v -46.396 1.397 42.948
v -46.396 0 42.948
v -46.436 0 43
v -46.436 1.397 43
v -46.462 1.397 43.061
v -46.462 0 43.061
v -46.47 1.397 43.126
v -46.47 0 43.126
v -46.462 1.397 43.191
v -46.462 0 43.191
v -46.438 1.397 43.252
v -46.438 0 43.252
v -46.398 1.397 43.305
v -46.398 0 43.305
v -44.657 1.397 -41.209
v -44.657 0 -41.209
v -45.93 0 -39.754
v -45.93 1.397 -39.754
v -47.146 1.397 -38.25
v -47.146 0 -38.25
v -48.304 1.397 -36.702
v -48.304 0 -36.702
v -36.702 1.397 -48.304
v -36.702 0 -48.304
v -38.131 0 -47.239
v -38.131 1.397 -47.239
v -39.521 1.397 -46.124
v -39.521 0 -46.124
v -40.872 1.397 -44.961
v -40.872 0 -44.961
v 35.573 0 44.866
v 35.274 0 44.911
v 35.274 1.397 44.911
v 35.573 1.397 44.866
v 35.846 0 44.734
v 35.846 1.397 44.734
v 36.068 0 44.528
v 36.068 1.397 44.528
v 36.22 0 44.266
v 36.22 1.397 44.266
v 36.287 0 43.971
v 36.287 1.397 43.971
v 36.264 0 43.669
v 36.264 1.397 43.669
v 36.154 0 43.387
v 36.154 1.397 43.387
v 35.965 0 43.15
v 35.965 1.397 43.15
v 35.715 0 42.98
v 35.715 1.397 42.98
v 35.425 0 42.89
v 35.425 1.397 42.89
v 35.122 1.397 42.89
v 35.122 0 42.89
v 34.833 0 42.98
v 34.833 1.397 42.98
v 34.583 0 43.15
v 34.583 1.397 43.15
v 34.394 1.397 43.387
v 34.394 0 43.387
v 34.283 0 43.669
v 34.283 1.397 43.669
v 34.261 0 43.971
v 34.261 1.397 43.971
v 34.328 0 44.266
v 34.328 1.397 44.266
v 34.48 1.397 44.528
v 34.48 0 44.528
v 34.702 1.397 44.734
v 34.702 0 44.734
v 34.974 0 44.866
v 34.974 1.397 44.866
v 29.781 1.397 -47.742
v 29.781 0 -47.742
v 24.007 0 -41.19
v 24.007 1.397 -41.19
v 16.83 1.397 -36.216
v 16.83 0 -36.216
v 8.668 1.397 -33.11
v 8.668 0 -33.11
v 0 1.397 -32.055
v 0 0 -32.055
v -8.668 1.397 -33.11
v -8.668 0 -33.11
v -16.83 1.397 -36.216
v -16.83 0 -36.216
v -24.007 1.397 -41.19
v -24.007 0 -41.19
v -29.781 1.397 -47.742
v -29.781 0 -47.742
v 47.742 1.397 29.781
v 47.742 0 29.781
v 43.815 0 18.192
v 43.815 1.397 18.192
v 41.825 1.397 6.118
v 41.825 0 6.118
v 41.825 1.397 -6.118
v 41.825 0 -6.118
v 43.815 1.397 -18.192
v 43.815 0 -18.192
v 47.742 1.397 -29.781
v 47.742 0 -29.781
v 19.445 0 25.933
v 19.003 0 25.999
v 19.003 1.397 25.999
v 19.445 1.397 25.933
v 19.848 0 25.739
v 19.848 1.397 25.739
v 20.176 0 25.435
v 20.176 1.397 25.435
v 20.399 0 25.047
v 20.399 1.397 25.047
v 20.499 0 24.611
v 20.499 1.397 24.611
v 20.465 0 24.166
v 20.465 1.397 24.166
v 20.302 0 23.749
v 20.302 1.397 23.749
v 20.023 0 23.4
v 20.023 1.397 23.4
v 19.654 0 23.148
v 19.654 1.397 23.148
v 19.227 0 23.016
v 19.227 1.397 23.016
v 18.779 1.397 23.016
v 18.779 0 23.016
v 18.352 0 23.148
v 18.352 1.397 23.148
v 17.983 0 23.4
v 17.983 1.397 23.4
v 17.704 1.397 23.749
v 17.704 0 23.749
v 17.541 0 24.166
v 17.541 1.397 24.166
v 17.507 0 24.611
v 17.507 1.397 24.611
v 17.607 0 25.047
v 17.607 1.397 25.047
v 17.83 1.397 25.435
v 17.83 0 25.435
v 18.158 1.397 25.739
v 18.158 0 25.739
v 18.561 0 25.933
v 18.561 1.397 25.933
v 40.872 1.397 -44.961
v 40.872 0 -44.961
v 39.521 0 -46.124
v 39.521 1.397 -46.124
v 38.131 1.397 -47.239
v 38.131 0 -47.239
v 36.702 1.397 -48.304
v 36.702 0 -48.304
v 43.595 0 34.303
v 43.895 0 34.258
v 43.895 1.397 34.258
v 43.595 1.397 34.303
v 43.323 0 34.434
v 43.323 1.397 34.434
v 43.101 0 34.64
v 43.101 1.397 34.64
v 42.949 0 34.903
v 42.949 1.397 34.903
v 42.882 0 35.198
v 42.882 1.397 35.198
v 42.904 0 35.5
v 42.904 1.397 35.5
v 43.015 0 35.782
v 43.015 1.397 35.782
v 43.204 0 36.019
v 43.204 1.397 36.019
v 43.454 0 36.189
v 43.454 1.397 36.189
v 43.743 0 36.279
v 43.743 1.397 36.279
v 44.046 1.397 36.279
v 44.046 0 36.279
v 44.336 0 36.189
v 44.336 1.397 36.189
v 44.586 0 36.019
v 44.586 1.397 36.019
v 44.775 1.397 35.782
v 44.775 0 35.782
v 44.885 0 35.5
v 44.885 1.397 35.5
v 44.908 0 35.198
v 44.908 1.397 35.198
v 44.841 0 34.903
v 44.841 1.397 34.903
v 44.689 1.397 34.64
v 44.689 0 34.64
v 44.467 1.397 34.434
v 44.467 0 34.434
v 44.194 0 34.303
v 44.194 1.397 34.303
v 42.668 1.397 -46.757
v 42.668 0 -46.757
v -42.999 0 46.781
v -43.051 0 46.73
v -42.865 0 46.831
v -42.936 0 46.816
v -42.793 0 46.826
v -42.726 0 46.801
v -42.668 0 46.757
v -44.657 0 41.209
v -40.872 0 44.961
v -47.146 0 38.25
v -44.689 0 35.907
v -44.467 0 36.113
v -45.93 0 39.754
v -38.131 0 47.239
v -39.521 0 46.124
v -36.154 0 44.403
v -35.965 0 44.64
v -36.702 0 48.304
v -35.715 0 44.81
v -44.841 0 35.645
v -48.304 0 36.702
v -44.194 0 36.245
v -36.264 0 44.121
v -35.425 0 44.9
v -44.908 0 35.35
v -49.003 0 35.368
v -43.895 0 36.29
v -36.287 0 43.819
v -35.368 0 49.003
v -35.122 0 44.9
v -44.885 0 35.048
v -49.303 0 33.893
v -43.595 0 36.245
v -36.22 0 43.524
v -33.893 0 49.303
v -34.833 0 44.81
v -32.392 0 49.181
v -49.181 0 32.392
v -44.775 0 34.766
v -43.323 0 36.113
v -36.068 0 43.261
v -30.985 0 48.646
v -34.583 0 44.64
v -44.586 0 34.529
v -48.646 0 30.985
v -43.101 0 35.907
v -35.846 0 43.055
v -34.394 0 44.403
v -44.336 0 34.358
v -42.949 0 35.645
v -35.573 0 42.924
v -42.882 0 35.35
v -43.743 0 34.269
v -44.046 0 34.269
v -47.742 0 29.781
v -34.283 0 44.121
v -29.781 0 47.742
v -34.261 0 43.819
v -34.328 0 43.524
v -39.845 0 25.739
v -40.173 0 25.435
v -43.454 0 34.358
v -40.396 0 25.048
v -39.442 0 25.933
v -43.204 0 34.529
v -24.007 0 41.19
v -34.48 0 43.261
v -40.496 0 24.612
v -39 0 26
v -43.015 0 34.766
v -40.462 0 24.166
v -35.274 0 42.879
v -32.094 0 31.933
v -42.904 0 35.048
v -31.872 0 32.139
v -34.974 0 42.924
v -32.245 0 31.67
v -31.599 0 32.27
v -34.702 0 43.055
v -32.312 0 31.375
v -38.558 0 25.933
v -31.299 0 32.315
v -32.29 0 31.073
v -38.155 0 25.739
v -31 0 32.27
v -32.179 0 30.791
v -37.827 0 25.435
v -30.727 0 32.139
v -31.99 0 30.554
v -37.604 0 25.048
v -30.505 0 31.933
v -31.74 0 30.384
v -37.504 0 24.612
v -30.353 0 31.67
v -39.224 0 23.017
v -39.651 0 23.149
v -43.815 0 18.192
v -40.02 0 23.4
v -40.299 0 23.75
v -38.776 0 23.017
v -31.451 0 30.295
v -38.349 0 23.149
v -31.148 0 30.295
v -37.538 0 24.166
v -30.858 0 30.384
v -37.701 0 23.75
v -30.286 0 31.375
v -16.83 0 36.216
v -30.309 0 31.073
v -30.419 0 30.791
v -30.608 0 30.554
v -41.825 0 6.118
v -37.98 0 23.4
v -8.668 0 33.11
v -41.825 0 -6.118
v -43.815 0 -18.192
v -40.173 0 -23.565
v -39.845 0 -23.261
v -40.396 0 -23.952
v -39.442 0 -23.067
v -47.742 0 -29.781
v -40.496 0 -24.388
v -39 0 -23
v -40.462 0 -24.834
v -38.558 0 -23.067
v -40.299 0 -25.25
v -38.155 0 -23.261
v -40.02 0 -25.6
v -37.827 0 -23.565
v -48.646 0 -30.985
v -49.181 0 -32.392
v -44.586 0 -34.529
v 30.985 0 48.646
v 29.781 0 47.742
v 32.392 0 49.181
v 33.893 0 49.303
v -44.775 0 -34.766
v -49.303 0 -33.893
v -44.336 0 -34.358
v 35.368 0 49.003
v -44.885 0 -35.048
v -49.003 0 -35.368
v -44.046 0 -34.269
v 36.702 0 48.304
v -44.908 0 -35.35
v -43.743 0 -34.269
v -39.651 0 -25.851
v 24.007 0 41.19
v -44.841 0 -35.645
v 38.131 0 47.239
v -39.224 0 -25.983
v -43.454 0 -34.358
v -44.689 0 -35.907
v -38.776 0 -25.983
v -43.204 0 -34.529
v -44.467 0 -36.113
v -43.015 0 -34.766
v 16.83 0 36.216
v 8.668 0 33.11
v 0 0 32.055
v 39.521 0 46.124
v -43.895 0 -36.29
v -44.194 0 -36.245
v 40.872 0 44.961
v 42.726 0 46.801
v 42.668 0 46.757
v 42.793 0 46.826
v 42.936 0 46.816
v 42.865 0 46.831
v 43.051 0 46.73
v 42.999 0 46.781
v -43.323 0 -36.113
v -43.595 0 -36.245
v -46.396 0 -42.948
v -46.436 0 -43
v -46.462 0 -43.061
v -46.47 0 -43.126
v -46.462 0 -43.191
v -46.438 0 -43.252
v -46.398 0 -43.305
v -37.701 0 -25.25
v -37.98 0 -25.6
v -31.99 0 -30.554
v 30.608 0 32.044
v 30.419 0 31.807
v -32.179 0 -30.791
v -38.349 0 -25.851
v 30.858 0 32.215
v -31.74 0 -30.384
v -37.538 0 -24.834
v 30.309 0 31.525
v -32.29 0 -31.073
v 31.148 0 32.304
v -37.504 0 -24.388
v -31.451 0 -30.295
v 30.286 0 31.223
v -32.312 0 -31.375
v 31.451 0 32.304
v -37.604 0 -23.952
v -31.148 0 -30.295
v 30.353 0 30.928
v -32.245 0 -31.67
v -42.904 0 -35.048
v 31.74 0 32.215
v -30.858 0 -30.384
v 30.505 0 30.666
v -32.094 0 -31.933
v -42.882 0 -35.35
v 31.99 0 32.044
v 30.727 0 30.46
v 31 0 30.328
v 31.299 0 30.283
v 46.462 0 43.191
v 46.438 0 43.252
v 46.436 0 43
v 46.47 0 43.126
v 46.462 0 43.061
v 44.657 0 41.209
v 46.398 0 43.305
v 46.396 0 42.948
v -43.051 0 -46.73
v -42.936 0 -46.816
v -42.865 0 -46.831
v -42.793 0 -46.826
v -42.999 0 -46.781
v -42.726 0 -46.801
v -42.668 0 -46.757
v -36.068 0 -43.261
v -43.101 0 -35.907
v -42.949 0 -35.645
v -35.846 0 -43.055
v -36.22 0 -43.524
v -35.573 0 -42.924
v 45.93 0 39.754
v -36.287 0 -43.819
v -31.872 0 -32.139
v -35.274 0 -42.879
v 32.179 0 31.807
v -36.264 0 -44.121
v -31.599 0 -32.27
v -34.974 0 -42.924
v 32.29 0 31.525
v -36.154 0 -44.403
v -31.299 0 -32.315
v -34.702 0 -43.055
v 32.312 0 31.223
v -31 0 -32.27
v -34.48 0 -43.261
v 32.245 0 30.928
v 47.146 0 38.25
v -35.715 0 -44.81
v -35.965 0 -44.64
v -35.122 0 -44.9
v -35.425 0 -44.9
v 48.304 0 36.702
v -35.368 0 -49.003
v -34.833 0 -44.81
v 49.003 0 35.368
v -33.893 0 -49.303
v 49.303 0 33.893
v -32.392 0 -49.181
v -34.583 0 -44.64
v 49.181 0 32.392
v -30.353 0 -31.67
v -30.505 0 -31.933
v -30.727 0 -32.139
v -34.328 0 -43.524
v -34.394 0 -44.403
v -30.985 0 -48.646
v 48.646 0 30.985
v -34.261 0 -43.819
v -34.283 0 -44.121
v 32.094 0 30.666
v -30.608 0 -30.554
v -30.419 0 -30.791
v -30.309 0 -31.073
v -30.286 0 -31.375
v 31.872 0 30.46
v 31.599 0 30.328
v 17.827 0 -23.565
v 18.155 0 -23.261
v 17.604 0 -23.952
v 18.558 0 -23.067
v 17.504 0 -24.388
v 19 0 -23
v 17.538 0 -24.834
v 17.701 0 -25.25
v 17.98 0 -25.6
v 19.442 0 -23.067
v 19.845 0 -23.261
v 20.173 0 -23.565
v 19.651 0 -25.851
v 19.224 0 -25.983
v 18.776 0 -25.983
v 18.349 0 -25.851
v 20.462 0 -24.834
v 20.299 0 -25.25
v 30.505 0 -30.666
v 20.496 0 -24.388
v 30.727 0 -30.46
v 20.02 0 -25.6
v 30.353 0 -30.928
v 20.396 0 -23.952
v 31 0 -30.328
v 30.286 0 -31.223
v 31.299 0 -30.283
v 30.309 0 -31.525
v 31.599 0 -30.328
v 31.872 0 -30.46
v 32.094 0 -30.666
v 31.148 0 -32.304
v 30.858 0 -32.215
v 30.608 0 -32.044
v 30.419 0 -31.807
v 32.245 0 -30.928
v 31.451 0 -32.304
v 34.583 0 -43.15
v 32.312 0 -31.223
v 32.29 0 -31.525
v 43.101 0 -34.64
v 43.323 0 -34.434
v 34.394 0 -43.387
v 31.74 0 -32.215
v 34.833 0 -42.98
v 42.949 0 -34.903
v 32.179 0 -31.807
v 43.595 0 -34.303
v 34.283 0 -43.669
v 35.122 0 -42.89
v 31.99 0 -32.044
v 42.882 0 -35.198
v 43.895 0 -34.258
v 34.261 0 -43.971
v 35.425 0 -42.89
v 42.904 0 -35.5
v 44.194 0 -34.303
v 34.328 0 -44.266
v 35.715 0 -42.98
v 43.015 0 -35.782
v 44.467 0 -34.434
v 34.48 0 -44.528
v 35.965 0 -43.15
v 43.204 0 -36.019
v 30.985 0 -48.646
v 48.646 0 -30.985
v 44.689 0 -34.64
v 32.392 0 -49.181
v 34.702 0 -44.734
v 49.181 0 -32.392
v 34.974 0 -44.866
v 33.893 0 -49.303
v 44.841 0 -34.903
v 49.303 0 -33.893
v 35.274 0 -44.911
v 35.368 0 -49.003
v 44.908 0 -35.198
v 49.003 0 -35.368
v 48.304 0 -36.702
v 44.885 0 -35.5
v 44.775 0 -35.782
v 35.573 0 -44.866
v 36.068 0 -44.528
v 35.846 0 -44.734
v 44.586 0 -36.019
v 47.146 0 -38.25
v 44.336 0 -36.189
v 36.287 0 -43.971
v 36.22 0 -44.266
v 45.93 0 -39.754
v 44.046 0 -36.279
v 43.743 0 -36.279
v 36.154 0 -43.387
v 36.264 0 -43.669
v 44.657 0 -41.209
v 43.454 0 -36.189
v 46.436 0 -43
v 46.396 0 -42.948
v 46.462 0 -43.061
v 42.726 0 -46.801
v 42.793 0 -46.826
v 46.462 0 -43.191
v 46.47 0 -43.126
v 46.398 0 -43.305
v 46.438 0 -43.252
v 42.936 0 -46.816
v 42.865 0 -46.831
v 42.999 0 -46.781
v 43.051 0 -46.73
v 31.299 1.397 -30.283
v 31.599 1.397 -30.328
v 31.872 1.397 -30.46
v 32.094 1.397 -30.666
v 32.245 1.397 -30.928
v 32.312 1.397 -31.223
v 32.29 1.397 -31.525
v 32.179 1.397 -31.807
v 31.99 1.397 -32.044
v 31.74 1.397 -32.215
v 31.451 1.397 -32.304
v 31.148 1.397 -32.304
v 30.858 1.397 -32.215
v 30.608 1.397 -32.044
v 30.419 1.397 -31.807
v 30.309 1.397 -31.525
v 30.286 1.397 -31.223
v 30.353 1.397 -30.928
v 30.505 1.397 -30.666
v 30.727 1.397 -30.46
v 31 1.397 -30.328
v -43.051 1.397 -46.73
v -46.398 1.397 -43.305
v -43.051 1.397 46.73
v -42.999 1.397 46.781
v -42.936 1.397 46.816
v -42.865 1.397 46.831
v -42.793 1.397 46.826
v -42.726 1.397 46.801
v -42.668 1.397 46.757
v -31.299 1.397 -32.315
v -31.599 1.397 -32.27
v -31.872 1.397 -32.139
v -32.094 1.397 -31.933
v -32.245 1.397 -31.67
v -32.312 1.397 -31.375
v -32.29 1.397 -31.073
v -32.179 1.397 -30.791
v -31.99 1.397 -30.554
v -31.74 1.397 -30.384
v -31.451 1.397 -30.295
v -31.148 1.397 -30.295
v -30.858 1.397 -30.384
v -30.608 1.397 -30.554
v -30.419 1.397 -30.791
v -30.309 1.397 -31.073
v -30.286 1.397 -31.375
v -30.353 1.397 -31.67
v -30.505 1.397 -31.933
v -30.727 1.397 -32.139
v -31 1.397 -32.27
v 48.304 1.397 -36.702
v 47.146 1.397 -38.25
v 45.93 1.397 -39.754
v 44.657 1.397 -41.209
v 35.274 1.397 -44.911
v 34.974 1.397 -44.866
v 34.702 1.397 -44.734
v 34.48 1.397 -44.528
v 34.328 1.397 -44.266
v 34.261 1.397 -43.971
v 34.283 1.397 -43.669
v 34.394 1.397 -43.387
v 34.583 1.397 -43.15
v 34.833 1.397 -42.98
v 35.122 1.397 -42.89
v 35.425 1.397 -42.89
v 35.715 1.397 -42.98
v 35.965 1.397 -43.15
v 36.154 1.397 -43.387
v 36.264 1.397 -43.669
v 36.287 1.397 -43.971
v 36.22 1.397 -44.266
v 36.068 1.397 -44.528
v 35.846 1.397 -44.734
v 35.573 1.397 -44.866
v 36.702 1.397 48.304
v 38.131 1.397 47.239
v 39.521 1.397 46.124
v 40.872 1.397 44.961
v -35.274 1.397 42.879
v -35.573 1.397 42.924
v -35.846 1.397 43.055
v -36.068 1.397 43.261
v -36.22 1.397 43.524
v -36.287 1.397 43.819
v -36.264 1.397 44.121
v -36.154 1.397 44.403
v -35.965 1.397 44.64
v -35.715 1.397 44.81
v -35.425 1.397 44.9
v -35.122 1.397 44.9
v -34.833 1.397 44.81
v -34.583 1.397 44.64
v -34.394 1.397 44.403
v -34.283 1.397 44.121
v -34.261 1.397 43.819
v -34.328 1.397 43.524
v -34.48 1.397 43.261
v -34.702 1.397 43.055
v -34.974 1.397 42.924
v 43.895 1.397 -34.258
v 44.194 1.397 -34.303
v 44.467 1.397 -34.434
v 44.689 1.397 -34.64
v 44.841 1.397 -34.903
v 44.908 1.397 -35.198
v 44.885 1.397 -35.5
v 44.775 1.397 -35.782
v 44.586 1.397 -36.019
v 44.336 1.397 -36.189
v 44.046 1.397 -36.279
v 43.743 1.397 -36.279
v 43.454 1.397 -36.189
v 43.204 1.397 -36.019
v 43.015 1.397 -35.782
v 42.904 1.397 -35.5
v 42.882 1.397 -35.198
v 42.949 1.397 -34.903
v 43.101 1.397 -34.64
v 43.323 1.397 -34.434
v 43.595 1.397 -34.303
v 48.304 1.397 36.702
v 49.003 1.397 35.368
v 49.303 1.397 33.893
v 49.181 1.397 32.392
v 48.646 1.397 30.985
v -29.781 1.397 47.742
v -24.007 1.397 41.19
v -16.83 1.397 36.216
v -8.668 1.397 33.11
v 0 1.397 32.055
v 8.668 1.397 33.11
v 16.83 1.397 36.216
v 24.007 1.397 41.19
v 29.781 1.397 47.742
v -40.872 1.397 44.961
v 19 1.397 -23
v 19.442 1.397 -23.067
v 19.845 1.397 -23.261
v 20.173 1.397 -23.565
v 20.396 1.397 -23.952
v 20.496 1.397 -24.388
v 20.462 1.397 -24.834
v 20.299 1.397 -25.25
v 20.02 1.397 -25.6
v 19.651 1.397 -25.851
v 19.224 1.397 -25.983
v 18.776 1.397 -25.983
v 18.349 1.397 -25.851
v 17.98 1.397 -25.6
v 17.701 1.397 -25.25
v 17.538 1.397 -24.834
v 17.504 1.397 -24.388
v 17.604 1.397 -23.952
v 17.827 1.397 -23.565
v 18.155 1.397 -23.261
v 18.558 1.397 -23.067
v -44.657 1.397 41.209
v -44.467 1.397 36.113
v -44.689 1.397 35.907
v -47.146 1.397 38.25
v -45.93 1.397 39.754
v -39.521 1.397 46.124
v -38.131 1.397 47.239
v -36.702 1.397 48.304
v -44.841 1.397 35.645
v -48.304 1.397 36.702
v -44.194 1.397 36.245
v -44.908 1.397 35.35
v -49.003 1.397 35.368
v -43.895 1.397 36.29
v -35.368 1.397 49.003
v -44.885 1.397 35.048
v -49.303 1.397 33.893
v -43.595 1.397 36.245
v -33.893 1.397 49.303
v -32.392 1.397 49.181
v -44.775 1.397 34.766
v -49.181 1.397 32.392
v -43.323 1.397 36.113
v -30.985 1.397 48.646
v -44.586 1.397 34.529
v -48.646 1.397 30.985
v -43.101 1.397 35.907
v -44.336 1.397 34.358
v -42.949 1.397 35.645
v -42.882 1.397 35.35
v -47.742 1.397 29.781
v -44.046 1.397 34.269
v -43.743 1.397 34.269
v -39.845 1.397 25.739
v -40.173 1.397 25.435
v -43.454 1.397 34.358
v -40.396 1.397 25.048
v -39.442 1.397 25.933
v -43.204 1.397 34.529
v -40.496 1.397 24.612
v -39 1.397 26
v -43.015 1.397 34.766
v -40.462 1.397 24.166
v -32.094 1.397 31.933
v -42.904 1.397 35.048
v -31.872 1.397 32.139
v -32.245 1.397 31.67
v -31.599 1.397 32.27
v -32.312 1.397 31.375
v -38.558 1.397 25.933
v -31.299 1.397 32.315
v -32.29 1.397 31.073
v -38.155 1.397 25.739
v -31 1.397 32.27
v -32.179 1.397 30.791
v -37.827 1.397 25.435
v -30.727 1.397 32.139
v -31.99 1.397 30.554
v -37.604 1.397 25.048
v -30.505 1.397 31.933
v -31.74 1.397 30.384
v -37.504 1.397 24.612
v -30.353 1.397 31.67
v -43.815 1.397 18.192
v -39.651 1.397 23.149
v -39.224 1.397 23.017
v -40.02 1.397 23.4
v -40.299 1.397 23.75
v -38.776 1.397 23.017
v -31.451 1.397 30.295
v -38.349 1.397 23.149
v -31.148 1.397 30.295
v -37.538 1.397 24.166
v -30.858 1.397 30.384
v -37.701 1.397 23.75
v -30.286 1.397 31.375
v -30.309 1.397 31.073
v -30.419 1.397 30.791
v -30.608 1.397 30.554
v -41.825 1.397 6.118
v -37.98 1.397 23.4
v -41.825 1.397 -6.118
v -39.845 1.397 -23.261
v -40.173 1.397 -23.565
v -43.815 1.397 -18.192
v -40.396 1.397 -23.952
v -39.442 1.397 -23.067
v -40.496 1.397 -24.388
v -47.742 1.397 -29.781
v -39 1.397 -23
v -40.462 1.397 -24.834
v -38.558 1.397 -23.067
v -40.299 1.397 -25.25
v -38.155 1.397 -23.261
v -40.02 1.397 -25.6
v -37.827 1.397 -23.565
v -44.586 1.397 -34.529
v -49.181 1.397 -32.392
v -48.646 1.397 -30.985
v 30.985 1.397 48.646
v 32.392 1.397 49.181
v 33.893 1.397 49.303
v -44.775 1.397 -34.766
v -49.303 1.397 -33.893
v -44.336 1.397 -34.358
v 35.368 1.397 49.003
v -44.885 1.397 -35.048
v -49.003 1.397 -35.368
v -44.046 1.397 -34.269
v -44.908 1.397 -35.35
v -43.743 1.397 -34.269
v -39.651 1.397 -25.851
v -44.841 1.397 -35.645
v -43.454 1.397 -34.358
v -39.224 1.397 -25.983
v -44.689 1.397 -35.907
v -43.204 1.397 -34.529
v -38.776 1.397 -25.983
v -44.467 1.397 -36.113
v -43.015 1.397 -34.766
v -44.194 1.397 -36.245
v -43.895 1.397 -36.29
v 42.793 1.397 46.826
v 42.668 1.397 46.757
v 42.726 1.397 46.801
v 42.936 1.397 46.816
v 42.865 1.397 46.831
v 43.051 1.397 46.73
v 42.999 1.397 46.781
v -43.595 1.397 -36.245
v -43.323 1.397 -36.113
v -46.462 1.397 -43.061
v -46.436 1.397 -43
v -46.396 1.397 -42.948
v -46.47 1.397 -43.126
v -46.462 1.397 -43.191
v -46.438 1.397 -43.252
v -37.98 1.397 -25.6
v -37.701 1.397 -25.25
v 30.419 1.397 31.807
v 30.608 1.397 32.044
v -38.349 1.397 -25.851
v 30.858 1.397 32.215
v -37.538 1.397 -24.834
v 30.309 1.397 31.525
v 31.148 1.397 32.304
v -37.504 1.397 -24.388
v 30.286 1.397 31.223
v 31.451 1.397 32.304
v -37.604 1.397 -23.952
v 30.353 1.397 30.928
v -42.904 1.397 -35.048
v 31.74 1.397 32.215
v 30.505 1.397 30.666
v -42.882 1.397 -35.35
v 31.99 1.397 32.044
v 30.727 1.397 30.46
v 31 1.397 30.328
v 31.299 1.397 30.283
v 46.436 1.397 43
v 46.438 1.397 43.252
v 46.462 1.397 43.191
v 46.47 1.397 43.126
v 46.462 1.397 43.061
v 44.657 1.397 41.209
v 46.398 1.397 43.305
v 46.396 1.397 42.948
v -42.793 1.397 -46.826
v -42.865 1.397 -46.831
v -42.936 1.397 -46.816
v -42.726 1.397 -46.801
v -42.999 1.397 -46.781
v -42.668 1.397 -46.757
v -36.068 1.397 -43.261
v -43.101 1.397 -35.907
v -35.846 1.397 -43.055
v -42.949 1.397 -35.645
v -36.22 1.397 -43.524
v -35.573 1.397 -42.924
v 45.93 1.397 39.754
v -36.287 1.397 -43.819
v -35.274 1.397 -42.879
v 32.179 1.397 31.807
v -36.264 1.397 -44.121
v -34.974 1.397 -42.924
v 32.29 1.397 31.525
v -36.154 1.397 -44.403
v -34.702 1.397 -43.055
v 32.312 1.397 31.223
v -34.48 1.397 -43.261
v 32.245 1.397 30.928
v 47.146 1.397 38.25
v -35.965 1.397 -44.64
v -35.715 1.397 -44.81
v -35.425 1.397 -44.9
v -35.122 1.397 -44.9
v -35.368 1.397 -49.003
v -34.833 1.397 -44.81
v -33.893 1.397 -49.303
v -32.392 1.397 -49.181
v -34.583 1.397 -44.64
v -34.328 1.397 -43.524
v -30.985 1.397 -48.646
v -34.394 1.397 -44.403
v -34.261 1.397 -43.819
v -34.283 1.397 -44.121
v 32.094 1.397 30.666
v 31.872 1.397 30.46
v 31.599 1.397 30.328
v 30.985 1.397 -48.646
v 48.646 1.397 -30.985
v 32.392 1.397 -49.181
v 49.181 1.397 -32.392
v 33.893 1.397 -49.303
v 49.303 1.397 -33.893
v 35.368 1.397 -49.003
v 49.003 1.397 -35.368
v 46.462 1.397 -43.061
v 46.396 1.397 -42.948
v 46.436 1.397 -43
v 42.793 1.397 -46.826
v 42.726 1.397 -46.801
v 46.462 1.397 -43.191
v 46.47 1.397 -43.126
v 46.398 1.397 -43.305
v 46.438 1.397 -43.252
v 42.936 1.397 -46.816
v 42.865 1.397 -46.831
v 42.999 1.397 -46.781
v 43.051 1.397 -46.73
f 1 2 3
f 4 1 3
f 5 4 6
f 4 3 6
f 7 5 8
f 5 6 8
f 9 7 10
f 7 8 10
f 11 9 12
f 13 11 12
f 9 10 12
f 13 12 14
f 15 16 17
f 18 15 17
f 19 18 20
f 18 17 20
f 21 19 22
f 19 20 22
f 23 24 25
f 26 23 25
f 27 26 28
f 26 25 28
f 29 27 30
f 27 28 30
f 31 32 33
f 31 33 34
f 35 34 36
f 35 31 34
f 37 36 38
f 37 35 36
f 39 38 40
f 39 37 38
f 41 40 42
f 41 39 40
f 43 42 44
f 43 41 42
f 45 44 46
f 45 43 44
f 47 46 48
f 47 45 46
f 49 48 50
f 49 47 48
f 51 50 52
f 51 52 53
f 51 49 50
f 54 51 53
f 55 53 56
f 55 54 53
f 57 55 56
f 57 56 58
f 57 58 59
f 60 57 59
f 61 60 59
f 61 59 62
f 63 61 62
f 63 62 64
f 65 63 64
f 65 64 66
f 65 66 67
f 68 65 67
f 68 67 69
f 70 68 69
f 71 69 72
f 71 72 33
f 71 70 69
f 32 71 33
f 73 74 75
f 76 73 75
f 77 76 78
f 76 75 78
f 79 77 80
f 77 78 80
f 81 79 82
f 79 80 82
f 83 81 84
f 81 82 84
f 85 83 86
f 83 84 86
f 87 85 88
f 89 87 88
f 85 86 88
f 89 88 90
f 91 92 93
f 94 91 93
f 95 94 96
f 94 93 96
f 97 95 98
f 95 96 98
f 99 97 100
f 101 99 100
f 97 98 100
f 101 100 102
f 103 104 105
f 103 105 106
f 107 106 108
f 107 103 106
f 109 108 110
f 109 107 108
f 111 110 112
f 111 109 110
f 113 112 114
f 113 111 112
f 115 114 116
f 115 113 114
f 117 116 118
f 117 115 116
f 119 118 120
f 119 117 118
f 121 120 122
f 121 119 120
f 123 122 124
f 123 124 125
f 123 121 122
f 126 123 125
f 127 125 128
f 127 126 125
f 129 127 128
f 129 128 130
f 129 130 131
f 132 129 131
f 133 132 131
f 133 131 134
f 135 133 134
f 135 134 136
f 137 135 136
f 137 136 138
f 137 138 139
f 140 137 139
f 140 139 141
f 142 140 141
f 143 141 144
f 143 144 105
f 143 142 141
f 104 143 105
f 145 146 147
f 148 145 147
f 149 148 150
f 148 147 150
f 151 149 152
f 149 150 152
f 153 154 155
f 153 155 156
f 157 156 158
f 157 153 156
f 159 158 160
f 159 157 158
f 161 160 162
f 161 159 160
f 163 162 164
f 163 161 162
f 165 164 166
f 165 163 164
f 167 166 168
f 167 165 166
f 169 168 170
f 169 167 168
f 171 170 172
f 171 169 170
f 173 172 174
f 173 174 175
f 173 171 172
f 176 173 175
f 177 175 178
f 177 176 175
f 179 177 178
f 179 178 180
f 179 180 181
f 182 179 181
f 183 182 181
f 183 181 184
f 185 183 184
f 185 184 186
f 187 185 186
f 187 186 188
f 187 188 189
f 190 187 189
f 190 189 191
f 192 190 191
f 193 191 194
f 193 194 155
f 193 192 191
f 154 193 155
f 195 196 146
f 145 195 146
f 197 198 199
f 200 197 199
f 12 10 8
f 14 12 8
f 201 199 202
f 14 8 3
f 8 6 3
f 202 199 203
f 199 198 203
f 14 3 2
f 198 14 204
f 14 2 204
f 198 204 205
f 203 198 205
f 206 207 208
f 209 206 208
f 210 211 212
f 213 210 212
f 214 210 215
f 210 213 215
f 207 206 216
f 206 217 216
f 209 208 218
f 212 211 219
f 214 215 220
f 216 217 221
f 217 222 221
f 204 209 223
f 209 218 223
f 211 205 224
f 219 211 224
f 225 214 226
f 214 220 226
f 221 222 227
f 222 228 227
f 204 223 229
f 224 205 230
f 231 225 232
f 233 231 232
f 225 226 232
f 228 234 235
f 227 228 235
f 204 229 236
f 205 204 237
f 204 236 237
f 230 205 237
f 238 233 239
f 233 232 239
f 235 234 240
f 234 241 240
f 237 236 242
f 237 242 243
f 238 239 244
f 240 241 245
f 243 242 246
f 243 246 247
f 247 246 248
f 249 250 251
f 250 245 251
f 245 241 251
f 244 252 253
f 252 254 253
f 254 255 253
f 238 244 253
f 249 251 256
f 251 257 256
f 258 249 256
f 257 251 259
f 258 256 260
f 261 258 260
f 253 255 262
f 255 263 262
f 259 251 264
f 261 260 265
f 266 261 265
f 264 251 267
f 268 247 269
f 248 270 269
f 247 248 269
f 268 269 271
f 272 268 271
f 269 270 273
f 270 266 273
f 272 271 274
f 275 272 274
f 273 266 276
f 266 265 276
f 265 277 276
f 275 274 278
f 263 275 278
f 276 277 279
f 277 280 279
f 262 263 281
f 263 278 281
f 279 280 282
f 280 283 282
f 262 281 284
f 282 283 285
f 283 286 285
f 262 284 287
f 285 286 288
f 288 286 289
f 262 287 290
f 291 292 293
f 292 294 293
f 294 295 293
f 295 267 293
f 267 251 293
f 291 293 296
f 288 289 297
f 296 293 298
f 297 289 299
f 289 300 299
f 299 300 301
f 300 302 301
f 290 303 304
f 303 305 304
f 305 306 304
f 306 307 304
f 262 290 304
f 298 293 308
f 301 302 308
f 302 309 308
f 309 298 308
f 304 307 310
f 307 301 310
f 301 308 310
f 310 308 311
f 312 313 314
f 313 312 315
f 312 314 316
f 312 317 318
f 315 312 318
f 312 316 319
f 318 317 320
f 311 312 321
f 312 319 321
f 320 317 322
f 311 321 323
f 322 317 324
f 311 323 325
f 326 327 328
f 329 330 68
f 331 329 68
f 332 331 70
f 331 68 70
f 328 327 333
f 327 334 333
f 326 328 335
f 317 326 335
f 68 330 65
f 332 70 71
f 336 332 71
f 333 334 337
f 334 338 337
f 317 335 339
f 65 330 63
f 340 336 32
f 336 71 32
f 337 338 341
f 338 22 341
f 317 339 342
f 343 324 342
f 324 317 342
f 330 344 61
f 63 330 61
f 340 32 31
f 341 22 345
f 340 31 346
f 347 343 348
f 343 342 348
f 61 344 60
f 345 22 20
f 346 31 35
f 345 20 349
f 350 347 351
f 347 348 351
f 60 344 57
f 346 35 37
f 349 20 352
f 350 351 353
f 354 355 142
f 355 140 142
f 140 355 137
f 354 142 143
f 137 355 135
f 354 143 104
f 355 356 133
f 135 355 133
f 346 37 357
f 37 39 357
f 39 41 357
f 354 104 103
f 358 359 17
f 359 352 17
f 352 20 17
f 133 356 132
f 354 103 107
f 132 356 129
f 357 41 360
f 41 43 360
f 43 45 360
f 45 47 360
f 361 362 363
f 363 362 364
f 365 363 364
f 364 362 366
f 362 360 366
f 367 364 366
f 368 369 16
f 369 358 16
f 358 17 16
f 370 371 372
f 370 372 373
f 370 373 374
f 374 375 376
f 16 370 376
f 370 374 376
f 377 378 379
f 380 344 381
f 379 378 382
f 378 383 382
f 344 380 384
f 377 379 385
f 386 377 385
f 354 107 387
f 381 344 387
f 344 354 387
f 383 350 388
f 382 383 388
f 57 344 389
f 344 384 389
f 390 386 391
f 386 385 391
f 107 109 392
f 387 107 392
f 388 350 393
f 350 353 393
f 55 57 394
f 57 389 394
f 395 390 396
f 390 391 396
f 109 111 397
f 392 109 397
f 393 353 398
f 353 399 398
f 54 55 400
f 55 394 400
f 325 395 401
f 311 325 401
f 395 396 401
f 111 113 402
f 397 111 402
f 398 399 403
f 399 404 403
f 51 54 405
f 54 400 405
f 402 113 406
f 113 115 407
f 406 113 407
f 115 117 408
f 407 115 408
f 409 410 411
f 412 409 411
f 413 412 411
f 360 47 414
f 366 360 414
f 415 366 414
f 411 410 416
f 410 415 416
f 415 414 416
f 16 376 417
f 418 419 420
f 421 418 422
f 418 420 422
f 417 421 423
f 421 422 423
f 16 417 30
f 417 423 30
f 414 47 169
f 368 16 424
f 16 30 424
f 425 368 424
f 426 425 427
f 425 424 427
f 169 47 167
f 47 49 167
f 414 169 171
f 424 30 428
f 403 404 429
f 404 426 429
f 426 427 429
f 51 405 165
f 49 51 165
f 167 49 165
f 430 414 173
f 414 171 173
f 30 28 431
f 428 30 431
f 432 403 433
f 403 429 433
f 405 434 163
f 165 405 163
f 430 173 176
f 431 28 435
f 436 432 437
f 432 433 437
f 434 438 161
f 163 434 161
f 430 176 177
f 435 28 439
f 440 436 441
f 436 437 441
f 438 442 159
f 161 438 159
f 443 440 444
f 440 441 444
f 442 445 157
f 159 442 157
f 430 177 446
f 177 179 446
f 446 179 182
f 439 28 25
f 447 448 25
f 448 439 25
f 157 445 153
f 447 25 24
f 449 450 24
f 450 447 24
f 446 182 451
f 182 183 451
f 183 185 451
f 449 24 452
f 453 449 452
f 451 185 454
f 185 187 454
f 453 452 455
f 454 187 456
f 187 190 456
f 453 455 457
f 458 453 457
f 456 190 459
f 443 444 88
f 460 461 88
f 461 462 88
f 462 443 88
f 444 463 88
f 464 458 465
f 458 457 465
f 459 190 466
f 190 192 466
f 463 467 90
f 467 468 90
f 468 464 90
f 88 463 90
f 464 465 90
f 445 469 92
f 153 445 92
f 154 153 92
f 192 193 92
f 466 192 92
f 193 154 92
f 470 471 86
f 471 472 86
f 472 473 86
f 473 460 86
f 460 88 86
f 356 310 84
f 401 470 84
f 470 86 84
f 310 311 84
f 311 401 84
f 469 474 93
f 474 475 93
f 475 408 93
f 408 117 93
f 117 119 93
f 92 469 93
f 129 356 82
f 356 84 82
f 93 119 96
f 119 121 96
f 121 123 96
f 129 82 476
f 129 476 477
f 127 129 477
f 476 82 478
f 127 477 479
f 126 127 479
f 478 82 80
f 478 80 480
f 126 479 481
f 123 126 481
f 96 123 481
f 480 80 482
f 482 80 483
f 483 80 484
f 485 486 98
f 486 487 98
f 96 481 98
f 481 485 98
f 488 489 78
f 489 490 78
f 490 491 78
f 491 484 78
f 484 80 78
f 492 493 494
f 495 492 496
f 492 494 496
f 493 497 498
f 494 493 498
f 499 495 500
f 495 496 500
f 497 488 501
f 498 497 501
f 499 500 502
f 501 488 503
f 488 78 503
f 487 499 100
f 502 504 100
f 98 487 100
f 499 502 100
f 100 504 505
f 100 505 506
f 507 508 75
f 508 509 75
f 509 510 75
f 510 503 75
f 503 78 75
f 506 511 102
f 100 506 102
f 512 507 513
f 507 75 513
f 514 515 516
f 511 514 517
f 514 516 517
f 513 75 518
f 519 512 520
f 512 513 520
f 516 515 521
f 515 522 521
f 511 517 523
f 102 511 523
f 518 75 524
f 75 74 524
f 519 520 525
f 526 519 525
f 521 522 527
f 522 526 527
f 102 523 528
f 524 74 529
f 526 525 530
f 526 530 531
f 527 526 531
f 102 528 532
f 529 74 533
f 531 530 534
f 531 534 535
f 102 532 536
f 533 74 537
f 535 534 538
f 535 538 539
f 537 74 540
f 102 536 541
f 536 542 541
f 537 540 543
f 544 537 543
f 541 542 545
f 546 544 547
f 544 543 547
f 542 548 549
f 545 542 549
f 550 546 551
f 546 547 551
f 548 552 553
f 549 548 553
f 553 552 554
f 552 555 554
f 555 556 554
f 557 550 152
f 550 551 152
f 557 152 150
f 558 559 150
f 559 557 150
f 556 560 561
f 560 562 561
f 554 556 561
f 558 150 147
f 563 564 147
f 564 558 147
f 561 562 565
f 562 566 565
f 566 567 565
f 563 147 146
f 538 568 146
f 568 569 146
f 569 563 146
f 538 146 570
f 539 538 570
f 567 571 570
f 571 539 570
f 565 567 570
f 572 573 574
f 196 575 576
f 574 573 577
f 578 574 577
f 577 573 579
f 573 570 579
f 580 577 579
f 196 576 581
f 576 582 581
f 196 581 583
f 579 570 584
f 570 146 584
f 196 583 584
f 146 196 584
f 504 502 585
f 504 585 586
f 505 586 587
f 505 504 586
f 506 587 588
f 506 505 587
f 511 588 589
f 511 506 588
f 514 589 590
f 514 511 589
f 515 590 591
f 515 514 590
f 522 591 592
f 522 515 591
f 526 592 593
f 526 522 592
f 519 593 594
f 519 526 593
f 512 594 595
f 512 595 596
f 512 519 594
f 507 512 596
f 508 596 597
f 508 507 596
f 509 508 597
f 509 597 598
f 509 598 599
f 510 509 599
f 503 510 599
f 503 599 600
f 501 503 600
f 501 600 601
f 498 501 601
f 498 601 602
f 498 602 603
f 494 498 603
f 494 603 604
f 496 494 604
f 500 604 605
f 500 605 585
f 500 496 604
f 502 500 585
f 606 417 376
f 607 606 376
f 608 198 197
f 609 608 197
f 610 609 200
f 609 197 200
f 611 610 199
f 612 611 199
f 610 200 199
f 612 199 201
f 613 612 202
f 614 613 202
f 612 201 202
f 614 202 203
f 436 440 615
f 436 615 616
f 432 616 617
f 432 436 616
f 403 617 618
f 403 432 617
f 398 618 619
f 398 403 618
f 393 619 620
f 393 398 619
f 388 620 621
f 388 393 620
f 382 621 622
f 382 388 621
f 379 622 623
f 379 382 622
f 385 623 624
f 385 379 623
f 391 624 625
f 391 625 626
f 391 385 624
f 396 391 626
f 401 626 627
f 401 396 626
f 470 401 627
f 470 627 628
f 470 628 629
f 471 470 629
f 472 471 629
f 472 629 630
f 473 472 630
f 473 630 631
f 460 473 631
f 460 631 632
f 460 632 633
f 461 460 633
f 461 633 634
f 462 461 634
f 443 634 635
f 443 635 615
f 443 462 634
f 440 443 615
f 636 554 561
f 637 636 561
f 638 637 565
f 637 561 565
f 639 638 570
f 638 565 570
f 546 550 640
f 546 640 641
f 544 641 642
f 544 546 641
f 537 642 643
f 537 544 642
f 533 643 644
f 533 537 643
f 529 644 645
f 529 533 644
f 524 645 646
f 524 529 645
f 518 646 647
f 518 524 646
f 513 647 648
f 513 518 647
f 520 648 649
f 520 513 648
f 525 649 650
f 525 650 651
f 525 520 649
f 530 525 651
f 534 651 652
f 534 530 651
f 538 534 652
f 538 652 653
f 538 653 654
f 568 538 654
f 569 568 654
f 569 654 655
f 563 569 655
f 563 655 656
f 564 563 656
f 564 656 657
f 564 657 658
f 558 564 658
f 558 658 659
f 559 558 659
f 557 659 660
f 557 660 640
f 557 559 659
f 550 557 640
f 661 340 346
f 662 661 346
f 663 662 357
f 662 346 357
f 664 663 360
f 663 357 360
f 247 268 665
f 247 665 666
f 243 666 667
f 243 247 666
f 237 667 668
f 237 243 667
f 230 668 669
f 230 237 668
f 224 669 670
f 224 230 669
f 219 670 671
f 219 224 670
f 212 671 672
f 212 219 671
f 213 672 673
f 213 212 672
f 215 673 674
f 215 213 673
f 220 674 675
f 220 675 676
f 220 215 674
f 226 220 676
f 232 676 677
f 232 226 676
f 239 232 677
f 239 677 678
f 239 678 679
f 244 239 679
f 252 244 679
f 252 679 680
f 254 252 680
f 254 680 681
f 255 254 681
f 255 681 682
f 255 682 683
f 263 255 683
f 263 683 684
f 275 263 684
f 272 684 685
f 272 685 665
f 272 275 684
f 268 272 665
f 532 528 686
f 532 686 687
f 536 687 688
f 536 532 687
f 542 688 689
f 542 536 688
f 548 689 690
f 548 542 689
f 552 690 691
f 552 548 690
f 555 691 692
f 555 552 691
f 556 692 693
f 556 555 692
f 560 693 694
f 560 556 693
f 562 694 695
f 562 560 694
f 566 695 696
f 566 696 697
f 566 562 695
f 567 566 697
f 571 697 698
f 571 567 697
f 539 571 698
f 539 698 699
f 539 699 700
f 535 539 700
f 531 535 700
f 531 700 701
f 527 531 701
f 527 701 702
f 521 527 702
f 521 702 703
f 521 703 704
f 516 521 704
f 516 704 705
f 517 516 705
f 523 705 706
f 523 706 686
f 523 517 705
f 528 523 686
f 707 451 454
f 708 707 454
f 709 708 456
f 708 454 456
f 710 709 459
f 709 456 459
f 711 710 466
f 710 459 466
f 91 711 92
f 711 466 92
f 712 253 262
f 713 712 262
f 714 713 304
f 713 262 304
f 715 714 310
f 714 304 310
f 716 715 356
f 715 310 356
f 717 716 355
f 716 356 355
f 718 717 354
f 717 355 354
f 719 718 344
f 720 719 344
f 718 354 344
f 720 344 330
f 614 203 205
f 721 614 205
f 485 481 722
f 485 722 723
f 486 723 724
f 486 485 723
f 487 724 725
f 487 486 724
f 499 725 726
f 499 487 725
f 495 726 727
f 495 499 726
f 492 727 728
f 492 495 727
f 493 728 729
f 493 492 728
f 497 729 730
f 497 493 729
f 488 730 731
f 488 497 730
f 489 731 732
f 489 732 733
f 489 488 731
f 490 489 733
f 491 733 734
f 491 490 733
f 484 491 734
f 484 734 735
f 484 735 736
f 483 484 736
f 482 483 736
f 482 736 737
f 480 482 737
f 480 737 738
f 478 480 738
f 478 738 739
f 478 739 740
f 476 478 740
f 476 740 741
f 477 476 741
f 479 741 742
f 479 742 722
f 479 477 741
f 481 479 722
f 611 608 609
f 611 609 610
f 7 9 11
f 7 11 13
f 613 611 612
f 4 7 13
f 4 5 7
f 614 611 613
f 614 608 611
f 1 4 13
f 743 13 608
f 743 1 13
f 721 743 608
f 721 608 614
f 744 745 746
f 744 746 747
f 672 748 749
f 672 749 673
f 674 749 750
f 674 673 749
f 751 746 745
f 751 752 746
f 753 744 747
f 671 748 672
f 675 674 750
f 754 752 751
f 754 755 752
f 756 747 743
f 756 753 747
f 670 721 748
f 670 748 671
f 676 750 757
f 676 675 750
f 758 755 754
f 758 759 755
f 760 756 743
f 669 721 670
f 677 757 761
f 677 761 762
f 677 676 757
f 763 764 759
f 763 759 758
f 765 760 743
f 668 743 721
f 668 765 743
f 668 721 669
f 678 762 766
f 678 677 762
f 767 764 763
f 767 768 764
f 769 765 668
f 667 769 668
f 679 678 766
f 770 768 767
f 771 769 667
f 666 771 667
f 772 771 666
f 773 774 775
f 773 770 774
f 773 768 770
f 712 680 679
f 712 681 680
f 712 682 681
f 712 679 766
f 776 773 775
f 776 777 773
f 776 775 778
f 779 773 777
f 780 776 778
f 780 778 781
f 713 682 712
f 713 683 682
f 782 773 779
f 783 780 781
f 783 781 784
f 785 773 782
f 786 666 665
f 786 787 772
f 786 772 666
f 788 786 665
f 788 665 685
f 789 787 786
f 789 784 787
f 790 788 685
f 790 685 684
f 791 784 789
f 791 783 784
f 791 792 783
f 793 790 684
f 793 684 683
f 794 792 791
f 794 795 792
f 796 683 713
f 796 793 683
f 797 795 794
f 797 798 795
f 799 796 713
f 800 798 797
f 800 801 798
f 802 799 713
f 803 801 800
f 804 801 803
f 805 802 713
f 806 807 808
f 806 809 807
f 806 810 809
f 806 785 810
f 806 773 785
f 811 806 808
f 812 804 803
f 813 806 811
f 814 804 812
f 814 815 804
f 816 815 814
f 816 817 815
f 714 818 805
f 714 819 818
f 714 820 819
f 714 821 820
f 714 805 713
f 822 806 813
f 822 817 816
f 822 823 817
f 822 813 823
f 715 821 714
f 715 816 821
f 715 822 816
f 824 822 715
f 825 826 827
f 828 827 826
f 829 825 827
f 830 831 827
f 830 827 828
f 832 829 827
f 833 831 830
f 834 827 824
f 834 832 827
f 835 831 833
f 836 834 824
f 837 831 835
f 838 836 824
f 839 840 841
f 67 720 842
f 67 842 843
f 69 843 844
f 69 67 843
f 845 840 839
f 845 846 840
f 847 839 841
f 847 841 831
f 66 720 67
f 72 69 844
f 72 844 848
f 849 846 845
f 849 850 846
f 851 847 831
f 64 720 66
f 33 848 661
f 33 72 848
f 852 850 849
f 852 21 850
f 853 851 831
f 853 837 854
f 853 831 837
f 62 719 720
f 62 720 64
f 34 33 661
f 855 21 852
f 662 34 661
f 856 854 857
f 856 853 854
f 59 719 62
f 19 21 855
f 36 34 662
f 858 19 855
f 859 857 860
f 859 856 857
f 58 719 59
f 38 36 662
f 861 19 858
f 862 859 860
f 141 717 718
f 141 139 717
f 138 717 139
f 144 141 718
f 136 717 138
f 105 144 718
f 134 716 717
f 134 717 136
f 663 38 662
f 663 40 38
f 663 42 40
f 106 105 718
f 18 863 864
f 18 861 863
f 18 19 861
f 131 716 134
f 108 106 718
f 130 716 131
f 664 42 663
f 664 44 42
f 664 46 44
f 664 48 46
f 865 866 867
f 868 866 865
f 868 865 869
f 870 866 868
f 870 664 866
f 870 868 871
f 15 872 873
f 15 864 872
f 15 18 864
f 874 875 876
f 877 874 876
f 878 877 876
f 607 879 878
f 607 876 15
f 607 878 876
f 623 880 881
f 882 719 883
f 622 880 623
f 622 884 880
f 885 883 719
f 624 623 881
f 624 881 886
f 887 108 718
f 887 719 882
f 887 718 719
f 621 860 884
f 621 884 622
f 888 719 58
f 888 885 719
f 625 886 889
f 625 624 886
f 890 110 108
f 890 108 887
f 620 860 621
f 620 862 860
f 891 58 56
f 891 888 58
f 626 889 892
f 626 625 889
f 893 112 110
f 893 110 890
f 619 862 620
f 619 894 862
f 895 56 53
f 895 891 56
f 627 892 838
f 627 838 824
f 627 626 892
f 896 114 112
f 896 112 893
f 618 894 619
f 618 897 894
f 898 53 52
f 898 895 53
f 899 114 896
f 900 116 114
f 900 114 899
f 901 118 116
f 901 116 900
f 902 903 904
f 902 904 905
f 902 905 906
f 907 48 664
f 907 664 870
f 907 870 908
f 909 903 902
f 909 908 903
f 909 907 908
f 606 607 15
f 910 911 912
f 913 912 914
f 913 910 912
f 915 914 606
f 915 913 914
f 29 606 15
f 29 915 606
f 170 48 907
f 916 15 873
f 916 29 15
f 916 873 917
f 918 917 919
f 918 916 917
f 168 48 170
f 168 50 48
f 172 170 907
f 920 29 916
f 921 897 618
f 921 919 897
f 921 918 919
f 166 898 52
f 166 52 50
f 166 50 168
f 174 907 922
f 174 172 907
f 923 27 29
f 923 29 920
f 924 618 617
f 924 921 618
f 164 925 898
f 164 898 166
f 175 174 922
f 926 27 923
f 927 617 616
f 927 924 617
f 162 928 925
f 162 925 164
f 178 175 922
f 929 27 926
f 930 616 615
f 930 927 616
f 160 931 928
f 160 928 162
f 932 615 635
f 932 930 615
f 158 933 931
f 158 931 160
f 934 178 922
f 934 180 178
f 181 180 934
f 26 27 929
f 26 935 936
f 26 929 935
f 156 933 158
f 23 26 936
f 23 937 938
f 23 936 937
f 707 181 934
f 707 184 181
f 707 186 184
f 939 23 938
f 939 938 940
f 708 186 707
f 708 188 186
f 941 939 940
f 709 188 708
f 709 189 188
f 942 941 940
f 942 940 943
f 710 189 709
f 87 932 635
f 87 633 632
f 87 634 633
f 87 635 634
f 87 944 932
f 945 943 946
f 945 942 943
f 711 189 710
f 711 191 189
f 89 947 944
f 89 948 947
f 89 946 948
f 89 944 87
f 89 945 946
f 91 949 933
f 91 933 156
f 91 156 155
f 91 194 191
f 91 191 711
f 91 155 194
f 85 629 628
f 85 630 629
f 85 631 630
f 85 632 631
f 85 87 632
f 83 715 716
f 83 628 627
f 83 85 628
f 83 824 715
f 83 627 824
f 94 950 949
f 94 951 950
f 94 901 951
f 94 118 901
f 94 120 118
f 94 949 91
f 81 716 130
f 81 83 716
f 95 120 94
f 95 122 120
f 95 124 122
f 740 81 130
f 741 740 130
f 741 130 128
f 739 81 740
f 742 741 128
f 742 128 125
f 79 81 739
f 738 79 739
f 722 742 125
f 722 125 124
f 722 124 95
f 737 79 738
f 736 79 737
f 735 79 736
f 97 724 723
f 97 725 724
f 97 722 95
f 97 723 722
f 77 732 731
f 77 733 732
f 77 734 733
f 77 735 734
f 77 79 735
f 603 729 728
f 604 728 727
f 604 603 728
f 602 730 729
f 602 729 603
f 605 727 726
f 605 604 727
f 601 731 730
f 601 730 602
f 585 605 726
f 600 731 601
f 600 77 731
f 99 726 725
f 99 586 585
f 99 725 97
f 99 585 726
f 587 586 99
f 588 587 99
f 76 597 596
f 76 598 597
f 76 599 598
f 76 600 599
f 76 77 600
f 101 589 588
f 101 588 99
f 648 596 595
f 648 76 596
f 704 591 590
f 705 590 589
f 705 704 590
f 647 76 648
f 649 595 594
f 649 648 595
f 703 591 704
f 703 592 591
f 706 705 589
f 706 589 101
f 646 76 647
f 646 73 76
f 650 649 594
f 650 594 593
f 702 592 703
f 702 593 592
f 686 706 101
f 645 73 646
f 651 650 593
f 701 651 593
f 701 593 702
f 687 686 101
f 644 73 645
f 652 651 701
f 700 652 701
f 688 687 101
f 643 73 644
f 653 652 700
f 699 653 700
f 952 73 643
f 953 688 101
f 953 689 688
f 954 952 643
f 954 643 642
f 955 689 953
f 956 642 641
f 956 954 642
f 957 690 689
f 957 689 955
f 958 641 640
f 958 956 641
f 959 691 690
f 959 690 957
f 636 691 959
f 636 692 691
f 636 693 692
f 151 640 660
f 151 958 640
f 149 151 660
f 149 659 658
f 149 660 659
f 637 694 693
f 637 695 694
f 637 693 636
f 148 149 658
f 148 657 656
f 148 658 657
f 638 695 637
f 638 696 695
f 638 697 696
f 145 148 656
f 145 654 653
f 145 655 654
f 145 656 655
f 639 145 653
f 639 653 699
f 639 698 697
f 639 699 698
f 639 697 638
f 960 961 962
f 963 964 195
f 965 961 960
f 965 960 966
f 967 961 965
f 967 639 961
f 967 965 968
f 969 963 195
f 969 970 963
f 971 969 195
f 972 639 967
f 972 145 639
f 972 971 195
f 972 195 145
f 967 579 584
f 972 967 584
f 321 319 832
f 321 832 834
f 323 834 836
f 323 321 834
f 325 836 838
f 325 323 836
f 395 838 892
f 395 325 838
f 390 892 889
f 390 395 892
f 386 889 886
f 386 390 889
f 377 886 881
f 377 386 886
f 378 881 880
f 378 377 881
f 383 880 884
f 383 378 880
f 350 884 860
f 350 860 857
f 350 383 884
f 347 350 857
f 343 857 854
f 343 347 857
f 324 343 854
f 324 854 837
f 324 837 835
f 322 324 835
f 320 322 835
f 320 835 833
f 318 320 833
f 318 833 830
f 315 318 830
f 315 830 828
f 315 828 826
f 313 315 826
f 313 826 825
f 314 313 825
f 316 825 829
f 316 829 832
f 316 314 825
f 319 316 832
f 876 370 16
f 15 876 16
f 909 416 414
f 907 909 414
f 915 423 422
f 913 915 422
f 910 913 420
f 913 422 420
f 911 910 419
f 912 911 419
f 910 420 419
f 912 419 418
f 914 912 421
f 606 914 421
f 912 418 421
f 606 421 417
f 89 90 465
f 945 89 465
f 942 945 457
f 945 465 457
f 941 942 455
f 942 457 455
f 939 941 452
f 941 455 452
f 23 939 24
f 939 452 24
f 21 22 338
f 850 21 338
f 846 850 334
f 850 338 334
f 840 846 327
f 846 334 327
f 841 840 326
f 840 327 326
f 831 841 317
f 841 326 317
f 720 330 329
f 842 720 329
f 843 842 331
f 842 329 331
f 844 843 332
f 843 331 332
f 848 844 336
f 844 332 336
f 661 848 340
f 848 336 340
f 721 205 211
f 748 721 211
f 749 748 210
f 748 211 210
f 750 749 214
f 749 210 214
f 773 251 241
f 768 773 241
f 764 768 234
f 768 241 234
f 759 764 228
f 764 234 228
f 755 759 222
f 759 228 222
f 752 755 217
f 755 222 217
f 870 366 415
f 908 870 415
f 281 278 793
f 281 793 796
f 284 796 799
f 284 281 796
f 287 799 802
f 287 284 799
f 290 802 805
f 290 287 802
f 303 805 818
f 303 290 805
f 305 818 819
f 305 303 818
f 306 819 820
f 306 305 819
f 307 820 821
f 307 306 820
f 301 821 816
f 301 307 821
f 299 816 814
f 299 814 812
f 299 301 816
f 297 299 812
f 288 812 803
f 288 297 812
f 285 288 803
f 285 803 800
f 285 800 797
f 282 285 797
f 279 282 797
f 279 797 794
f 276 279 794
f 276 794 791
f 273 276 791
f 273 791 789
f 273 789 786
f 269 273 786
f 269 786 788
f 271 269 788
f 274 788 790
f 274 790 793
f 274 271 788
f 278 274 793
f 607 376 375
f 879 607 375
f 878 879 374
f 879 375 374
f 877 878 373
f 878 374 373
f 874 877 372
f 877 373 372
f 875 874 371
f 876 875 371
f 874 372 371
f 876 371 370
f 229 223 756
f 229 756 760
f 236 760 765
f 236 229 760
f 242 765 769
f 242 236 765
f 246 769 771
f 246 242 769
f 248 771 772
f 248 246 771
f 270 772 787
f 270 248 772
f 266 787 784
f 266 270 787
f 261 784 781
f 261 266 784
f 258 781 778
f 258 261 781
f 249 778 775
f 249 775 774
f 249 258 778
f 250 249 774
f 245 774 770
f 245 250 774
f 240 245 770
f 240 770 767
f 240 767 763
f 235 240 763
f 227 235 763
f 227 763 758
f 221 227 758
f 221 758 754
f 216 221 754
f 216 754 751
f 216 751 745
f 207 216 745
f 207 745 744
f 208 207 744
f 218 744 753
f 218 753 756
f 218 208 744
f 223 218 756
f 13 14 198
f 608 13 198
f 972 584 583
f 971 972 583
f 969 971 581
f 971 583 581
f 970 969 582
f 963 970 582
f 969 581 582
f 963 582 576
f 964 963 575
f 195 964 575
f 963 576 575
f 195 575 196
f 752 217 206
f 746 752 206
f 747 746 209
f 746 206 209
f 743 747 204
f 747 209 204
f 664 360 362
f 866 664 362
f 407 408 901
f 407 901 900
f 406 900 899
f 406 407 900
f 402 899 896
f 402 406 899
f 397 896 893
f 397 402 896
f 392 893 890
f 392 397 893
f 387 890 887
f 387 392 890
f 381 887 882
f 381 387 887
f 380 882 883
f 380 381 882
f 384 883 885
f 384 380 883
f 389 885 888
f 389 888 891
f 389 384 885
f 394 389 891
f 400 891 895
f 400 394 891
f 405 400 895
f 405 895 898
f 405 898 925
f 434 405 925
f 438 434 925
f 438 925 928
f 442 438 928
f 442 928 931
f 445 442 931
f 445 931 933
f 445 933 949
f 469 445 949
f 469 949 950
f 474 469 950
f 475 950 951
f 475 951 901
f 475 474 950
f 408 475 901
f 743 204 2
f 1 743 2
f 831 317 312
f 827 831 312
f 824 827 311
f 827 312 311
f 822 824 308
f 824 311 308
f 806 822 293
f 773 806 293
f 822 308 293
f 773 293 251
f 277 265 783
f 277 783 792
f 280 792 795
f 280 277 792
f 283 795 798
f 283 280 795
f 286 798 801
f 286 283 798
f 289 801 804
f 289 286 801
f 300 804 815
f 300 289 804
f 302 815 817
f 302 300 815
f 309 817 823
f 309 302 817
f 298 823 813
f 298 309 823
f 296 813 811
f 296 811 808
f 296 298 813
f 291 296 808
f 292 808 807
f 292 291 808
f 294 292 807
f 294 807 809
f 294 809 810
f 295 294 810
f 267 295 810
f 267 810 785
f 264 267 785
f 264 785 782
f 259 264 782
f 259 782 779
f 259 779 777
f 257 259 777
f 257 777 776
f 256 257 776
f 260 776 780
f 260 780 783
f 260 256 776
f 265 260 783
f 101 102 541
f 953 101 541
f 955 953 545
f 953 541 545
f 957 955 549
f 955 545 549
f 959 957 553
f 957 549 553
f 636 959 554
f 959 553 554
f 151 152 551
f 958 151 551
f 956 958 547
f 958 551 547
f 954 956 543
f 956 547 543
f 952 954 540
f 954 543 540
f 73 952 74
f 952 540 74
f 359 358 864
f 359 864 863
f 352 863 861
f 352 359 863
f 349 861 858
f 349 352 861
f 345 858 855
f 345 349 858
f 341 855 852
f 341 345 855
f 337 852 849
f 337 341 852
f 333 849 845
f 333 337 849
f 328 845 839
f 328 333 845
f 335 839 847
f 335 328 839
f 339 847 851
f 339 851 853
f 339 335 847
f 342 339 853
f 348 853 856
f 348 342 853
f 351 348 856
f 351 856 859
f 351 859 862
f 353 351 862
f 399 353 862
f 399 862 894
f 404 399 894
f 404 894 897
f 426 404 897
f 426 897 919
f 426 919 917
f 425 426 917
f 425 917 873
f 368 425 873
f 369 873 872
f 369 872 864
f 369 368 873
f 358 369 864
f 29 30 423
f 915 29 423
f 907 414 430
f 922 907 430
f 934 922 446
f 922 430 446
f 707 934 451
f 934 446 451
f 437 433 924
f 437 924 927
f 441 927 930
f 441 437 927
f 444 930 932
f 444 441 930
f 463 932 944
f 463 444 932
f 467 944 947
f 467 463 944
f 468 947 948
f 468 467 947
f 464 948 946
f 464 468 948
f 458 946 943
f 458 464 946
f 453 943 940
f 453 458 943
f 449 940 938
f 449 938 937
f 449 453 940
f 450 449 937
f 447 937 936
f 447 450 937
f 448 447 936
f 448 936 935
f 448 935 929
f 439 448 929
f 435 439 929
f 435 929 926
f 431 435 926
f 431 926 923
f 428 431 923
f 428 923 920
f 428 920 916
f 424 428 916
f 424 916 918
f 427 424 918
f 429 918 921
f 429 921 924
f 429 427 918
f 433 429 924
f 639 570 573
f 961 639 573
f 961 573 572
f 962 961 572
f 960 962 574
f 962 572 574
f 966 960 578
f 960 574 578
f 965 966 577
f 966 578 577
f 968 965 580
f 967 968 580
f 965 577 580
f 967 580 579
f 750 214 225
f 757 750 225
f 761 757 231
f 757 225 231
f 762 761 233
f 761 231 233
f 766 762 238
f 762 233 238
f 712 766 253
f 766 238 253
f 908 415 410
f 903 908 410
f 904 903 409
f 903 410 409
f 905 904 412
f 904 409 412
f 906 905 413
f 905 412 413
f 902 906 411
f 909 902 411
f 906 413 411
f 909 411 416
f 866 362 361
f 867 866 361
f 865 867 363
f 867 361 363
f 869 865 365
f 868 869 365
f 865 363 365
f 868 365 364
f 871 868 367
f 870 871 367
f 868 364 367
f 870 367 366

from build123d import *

# Parameters (mm, degrees)
SKETCH1_R           = 1.015999988
SKETCH1_R_2         = 1.5
BOSS_EXTRUDE1_DEPTH = 1.397


with BuildPart() as part:
    # Sketch1 → Boss-Extrude1 (new body)
    with BuildSketch(Plane(origin=(0, 0, 0), x_dir=(1, 0, 0), z_dir=(0, 1, 0))):
        with BuildLine():
            Line((-44.657487237, -41.209177315), (-46.396043568, -42.947733628))
            ThreePointArc((-46.396043568, -42.947733628), (-46.470434263, -43.125880965), (-46.398093324, -43.304870455))
            Line((-46.398093324, -43.304870455), (-43.050556795, -46.730153534))
            ThreePointArc((-43.050556795, -46.730153534), (-42.865374809, -46.831022569), (-42.667823867, -46.757262447))
            Line((-42.667823867, -46.757262447), (-40.871772634, -44.961211232))
            ThreePointArc((-40.871772634, -44.961211232), (-38.831009245, -46.687575098), (-36.702263685, -48.30420423))
            ThreePointArc((-36.702263685, -48.30420423), (-33.138347002, -49.294565873), (-29.78114627, -47.741658512))
            ThreePointArc((-29.78114627, -47.741658512), (0, -32.054645119), (29.78114627, -47.741658512))
            ThreePointArc((29.78114627, -47.741658512), (33.138347002, -49.294565873), (36.702263685, -48.30420423))
            ThreePointArc((36.702263685, -48.30420423), (38.831009245, -46.687575098), (40.871772634, -44.961211232))
            Line((40.871772634, -44.961211232), (42.667823867, -46.757262447))
            ThreePointArc((42.667823867, -46.757262447), (42.865374809, -46.831022569), (43.050556795, -46.730153534))
            Line((43.050556795, -46.730153534), (46.398093324, -43.304870455))
            ThreePointArc((46.398093324, -43.304870455), (46.470434263, -43.125880965), (46.396043568, -42.947733628))
            Line((46.396043568, -42.947733628), (44.657487237, -41.209177315))
            ThreePointArc((44.657487237, -41.209177315), (46.545191357, -39.007785017), (48.30420423, -36.702263685))
            ThreePointArc((48.30420423, -36.702263685), (49.294565905, -33.13834702), (47.741658512, -29.78114627))
            ThreePointArc((47.741658512, -29.78114627), (41.575395348, 0), (47.741658512, 29.78114627))
            ThreePointArc((47.741658512, 29.78114627), (49.294565905, 33.13834702), (48.30420423, 36.702263685))
            ThreePointArc((48.30420423, 36.702263685), (46.545191357, 39.007785017), (44.657487237, 41.209177315))
            Line((44.657487237, 41.209177315), (46.396043568, 42.947733628))
            ThreePointArc((46.396043568, 42.947733628), (46.470434263, 43.125880965), (46.398093324, 43.304870455))
            Line((46.398093324, 43.304870455), (43.050556795, 46.730153534))
            ThreePointArc((43.050556795, 46.730153534), (42.865374809, 46.831022569), (42.667823867, 46.757262447))
            Line((42.667823867, 46.757262447), (40.871772634, 44.961211232))
            ThreePointArc((40.871772634, 44.961211232), (38.831009245, 46.687575098), (36.702263685, 48.30420423))
            ThreePointArc((36.702263685, 48.30420423), (33.138347002, 49.294565873), (29.78114627, 47.741658512))
            ThreePointArc((29.78114627, 47.741658512), (0, 32.054645119), (-29.78114627, 47.741658512))
            ThreePointArc((-29.78114627, 47.741658512), (-33.138347002, 49.294565873), (-36.702263685, 48.30420423))
            ThreePointArc((-36.702263685, 48.30420423), (-38.831009245, 46.687575098), (-40.871772634, 44.961211232))
            Line((-40.871772634, 44.961211232), (-42.667823867, 46.757262447))
            ThreePointArc((-42.667823867, 46.757262447), (-42.865374809, 46.831022569), (-43.050556795, 46.730153534))
            Line((-43.050556795, 46.730153534), (-46.398093324, 43.304870455))
            ThreePointArc((-46.398093324, 43.304870455), (-46.470434263, 43.125880965), (-46.396043568, 42.947733628))
            Line((-46.396043568, 42.947733628), (-44.657487237, 41.209177315))
            ThreePointArc((-44.657487237, 41.209177315), (-46.545191357, 39.007785017), (-48.30420423, 36.702263685))
            ThreePointArc((-48.30420423, 36.702263685), (-49.294565905, 33.13834702), (-47.741658512, 29.78114627))
            ThreePointArc((-47.741658512, 29.78114627), (-41.575395348, 0), (-47.741658512, -29.78114627))
            ThreePointArc((-47.741658512, -29.78114627), (-49.294565905, -33.13834702), (-48.30420423, -36.702263685))
            ThreePointArc((-48.30420423, -36.702263685), (-46.545191357, -39.007785017), (-44.657487237, -41.209177315))
        make_face()
        with Locations(Location((-35.273880272, -43.89492624, 0), (0, 0, 90))):
            Circle(SKETCH1_R, mode=Mode.SUBTRACT)
        with Locations(Location((-43.894926149, -35.273880364, 0), (0, 0, 270))):
            Circle(SKETCH1_R, mode=Mode.SUBTRACT)
        with Locations(Location((-31.299173944, -31.299174035, 0), (0, 0, 270))):
            Circle(SKETCH1_R, mode=Mode.SUBTRACT)
        with Locations(Location((43.894926149, -35.273880364, 0), (0, 0, 90))):
            Circle(SKETCH1_R, mode=Mode.SUBTRACT)
        with Locations(Location((35.273880272, -43.89492624, 0), (0, 0, 270))):
            Circle(SKETCH1_R, mode=Mode.SUBTRACT)
        with Locations(Location((31.299173944, -31.299174035, 0), (0, 0, 90))):
            Circle(SKETCH1_R, mode=Mode.SUBTRACT)
        with Locations(Location((-35.273880272, 43.89492624, 0), (0, 0, 270))):
            Circle(SKETCH1_R, mode=Mode.SUBTRACT)
        with Locations(Location((-31.299173944, 31.299174035, 0), (0, 0, 90))):
            Circle(SKETCH1_R, mode=Mode.SUBTRACT)
        with Locations(Location((-43.894926149, 35.273880364, 0), (0, 0, 90))):
            Circle(SKETCH1_R, mode=Mode.SUBTRACT)
        with Locations(Location((43.894926149, 35.273880364, 0), (0, 0, 270))):
            Circle(SKETCH1_R, mode=Mode.SUBTRACT)
        with Locations(Location((35.273880272, 43.89492624, 0), (0, 0, 90))):
            Circle(SKETCH1_R, mode=Mode.SUBTRACT)
        with Locations(Location((31.299173944, 31.299174035, 0), (0, 0, 270))):
            Circle(SKETCH1_R, mode=Mode.SUBTRACT)
        with Locations(Location((-39, 24.5, 0), (0, 0, 270))):
            Circle(SKETCH1_R_2, mode=Mode.SUBTRACT)
        with Locations(Location((19, 24.5, 0), (0, 0, 270))):
            Circle(SKETCH1_R_2, mode=Mode.SUBTRACT)
        with Locations(Location((19.002972949, -24.499403884, 0), (0, 0, 270))):
            Circle(SKETCH1_R_2, mode=Mode.SUBTRACT)
        with Locations(Location((-39, -24.5, 0), (0, 0, 270))):
            Circle(SKETCH1_R_2, mode=Mode.SUBTRACT)
    extrude(amount=BOSS_EXTRUDE1_DEPTH)


solid = part.part
